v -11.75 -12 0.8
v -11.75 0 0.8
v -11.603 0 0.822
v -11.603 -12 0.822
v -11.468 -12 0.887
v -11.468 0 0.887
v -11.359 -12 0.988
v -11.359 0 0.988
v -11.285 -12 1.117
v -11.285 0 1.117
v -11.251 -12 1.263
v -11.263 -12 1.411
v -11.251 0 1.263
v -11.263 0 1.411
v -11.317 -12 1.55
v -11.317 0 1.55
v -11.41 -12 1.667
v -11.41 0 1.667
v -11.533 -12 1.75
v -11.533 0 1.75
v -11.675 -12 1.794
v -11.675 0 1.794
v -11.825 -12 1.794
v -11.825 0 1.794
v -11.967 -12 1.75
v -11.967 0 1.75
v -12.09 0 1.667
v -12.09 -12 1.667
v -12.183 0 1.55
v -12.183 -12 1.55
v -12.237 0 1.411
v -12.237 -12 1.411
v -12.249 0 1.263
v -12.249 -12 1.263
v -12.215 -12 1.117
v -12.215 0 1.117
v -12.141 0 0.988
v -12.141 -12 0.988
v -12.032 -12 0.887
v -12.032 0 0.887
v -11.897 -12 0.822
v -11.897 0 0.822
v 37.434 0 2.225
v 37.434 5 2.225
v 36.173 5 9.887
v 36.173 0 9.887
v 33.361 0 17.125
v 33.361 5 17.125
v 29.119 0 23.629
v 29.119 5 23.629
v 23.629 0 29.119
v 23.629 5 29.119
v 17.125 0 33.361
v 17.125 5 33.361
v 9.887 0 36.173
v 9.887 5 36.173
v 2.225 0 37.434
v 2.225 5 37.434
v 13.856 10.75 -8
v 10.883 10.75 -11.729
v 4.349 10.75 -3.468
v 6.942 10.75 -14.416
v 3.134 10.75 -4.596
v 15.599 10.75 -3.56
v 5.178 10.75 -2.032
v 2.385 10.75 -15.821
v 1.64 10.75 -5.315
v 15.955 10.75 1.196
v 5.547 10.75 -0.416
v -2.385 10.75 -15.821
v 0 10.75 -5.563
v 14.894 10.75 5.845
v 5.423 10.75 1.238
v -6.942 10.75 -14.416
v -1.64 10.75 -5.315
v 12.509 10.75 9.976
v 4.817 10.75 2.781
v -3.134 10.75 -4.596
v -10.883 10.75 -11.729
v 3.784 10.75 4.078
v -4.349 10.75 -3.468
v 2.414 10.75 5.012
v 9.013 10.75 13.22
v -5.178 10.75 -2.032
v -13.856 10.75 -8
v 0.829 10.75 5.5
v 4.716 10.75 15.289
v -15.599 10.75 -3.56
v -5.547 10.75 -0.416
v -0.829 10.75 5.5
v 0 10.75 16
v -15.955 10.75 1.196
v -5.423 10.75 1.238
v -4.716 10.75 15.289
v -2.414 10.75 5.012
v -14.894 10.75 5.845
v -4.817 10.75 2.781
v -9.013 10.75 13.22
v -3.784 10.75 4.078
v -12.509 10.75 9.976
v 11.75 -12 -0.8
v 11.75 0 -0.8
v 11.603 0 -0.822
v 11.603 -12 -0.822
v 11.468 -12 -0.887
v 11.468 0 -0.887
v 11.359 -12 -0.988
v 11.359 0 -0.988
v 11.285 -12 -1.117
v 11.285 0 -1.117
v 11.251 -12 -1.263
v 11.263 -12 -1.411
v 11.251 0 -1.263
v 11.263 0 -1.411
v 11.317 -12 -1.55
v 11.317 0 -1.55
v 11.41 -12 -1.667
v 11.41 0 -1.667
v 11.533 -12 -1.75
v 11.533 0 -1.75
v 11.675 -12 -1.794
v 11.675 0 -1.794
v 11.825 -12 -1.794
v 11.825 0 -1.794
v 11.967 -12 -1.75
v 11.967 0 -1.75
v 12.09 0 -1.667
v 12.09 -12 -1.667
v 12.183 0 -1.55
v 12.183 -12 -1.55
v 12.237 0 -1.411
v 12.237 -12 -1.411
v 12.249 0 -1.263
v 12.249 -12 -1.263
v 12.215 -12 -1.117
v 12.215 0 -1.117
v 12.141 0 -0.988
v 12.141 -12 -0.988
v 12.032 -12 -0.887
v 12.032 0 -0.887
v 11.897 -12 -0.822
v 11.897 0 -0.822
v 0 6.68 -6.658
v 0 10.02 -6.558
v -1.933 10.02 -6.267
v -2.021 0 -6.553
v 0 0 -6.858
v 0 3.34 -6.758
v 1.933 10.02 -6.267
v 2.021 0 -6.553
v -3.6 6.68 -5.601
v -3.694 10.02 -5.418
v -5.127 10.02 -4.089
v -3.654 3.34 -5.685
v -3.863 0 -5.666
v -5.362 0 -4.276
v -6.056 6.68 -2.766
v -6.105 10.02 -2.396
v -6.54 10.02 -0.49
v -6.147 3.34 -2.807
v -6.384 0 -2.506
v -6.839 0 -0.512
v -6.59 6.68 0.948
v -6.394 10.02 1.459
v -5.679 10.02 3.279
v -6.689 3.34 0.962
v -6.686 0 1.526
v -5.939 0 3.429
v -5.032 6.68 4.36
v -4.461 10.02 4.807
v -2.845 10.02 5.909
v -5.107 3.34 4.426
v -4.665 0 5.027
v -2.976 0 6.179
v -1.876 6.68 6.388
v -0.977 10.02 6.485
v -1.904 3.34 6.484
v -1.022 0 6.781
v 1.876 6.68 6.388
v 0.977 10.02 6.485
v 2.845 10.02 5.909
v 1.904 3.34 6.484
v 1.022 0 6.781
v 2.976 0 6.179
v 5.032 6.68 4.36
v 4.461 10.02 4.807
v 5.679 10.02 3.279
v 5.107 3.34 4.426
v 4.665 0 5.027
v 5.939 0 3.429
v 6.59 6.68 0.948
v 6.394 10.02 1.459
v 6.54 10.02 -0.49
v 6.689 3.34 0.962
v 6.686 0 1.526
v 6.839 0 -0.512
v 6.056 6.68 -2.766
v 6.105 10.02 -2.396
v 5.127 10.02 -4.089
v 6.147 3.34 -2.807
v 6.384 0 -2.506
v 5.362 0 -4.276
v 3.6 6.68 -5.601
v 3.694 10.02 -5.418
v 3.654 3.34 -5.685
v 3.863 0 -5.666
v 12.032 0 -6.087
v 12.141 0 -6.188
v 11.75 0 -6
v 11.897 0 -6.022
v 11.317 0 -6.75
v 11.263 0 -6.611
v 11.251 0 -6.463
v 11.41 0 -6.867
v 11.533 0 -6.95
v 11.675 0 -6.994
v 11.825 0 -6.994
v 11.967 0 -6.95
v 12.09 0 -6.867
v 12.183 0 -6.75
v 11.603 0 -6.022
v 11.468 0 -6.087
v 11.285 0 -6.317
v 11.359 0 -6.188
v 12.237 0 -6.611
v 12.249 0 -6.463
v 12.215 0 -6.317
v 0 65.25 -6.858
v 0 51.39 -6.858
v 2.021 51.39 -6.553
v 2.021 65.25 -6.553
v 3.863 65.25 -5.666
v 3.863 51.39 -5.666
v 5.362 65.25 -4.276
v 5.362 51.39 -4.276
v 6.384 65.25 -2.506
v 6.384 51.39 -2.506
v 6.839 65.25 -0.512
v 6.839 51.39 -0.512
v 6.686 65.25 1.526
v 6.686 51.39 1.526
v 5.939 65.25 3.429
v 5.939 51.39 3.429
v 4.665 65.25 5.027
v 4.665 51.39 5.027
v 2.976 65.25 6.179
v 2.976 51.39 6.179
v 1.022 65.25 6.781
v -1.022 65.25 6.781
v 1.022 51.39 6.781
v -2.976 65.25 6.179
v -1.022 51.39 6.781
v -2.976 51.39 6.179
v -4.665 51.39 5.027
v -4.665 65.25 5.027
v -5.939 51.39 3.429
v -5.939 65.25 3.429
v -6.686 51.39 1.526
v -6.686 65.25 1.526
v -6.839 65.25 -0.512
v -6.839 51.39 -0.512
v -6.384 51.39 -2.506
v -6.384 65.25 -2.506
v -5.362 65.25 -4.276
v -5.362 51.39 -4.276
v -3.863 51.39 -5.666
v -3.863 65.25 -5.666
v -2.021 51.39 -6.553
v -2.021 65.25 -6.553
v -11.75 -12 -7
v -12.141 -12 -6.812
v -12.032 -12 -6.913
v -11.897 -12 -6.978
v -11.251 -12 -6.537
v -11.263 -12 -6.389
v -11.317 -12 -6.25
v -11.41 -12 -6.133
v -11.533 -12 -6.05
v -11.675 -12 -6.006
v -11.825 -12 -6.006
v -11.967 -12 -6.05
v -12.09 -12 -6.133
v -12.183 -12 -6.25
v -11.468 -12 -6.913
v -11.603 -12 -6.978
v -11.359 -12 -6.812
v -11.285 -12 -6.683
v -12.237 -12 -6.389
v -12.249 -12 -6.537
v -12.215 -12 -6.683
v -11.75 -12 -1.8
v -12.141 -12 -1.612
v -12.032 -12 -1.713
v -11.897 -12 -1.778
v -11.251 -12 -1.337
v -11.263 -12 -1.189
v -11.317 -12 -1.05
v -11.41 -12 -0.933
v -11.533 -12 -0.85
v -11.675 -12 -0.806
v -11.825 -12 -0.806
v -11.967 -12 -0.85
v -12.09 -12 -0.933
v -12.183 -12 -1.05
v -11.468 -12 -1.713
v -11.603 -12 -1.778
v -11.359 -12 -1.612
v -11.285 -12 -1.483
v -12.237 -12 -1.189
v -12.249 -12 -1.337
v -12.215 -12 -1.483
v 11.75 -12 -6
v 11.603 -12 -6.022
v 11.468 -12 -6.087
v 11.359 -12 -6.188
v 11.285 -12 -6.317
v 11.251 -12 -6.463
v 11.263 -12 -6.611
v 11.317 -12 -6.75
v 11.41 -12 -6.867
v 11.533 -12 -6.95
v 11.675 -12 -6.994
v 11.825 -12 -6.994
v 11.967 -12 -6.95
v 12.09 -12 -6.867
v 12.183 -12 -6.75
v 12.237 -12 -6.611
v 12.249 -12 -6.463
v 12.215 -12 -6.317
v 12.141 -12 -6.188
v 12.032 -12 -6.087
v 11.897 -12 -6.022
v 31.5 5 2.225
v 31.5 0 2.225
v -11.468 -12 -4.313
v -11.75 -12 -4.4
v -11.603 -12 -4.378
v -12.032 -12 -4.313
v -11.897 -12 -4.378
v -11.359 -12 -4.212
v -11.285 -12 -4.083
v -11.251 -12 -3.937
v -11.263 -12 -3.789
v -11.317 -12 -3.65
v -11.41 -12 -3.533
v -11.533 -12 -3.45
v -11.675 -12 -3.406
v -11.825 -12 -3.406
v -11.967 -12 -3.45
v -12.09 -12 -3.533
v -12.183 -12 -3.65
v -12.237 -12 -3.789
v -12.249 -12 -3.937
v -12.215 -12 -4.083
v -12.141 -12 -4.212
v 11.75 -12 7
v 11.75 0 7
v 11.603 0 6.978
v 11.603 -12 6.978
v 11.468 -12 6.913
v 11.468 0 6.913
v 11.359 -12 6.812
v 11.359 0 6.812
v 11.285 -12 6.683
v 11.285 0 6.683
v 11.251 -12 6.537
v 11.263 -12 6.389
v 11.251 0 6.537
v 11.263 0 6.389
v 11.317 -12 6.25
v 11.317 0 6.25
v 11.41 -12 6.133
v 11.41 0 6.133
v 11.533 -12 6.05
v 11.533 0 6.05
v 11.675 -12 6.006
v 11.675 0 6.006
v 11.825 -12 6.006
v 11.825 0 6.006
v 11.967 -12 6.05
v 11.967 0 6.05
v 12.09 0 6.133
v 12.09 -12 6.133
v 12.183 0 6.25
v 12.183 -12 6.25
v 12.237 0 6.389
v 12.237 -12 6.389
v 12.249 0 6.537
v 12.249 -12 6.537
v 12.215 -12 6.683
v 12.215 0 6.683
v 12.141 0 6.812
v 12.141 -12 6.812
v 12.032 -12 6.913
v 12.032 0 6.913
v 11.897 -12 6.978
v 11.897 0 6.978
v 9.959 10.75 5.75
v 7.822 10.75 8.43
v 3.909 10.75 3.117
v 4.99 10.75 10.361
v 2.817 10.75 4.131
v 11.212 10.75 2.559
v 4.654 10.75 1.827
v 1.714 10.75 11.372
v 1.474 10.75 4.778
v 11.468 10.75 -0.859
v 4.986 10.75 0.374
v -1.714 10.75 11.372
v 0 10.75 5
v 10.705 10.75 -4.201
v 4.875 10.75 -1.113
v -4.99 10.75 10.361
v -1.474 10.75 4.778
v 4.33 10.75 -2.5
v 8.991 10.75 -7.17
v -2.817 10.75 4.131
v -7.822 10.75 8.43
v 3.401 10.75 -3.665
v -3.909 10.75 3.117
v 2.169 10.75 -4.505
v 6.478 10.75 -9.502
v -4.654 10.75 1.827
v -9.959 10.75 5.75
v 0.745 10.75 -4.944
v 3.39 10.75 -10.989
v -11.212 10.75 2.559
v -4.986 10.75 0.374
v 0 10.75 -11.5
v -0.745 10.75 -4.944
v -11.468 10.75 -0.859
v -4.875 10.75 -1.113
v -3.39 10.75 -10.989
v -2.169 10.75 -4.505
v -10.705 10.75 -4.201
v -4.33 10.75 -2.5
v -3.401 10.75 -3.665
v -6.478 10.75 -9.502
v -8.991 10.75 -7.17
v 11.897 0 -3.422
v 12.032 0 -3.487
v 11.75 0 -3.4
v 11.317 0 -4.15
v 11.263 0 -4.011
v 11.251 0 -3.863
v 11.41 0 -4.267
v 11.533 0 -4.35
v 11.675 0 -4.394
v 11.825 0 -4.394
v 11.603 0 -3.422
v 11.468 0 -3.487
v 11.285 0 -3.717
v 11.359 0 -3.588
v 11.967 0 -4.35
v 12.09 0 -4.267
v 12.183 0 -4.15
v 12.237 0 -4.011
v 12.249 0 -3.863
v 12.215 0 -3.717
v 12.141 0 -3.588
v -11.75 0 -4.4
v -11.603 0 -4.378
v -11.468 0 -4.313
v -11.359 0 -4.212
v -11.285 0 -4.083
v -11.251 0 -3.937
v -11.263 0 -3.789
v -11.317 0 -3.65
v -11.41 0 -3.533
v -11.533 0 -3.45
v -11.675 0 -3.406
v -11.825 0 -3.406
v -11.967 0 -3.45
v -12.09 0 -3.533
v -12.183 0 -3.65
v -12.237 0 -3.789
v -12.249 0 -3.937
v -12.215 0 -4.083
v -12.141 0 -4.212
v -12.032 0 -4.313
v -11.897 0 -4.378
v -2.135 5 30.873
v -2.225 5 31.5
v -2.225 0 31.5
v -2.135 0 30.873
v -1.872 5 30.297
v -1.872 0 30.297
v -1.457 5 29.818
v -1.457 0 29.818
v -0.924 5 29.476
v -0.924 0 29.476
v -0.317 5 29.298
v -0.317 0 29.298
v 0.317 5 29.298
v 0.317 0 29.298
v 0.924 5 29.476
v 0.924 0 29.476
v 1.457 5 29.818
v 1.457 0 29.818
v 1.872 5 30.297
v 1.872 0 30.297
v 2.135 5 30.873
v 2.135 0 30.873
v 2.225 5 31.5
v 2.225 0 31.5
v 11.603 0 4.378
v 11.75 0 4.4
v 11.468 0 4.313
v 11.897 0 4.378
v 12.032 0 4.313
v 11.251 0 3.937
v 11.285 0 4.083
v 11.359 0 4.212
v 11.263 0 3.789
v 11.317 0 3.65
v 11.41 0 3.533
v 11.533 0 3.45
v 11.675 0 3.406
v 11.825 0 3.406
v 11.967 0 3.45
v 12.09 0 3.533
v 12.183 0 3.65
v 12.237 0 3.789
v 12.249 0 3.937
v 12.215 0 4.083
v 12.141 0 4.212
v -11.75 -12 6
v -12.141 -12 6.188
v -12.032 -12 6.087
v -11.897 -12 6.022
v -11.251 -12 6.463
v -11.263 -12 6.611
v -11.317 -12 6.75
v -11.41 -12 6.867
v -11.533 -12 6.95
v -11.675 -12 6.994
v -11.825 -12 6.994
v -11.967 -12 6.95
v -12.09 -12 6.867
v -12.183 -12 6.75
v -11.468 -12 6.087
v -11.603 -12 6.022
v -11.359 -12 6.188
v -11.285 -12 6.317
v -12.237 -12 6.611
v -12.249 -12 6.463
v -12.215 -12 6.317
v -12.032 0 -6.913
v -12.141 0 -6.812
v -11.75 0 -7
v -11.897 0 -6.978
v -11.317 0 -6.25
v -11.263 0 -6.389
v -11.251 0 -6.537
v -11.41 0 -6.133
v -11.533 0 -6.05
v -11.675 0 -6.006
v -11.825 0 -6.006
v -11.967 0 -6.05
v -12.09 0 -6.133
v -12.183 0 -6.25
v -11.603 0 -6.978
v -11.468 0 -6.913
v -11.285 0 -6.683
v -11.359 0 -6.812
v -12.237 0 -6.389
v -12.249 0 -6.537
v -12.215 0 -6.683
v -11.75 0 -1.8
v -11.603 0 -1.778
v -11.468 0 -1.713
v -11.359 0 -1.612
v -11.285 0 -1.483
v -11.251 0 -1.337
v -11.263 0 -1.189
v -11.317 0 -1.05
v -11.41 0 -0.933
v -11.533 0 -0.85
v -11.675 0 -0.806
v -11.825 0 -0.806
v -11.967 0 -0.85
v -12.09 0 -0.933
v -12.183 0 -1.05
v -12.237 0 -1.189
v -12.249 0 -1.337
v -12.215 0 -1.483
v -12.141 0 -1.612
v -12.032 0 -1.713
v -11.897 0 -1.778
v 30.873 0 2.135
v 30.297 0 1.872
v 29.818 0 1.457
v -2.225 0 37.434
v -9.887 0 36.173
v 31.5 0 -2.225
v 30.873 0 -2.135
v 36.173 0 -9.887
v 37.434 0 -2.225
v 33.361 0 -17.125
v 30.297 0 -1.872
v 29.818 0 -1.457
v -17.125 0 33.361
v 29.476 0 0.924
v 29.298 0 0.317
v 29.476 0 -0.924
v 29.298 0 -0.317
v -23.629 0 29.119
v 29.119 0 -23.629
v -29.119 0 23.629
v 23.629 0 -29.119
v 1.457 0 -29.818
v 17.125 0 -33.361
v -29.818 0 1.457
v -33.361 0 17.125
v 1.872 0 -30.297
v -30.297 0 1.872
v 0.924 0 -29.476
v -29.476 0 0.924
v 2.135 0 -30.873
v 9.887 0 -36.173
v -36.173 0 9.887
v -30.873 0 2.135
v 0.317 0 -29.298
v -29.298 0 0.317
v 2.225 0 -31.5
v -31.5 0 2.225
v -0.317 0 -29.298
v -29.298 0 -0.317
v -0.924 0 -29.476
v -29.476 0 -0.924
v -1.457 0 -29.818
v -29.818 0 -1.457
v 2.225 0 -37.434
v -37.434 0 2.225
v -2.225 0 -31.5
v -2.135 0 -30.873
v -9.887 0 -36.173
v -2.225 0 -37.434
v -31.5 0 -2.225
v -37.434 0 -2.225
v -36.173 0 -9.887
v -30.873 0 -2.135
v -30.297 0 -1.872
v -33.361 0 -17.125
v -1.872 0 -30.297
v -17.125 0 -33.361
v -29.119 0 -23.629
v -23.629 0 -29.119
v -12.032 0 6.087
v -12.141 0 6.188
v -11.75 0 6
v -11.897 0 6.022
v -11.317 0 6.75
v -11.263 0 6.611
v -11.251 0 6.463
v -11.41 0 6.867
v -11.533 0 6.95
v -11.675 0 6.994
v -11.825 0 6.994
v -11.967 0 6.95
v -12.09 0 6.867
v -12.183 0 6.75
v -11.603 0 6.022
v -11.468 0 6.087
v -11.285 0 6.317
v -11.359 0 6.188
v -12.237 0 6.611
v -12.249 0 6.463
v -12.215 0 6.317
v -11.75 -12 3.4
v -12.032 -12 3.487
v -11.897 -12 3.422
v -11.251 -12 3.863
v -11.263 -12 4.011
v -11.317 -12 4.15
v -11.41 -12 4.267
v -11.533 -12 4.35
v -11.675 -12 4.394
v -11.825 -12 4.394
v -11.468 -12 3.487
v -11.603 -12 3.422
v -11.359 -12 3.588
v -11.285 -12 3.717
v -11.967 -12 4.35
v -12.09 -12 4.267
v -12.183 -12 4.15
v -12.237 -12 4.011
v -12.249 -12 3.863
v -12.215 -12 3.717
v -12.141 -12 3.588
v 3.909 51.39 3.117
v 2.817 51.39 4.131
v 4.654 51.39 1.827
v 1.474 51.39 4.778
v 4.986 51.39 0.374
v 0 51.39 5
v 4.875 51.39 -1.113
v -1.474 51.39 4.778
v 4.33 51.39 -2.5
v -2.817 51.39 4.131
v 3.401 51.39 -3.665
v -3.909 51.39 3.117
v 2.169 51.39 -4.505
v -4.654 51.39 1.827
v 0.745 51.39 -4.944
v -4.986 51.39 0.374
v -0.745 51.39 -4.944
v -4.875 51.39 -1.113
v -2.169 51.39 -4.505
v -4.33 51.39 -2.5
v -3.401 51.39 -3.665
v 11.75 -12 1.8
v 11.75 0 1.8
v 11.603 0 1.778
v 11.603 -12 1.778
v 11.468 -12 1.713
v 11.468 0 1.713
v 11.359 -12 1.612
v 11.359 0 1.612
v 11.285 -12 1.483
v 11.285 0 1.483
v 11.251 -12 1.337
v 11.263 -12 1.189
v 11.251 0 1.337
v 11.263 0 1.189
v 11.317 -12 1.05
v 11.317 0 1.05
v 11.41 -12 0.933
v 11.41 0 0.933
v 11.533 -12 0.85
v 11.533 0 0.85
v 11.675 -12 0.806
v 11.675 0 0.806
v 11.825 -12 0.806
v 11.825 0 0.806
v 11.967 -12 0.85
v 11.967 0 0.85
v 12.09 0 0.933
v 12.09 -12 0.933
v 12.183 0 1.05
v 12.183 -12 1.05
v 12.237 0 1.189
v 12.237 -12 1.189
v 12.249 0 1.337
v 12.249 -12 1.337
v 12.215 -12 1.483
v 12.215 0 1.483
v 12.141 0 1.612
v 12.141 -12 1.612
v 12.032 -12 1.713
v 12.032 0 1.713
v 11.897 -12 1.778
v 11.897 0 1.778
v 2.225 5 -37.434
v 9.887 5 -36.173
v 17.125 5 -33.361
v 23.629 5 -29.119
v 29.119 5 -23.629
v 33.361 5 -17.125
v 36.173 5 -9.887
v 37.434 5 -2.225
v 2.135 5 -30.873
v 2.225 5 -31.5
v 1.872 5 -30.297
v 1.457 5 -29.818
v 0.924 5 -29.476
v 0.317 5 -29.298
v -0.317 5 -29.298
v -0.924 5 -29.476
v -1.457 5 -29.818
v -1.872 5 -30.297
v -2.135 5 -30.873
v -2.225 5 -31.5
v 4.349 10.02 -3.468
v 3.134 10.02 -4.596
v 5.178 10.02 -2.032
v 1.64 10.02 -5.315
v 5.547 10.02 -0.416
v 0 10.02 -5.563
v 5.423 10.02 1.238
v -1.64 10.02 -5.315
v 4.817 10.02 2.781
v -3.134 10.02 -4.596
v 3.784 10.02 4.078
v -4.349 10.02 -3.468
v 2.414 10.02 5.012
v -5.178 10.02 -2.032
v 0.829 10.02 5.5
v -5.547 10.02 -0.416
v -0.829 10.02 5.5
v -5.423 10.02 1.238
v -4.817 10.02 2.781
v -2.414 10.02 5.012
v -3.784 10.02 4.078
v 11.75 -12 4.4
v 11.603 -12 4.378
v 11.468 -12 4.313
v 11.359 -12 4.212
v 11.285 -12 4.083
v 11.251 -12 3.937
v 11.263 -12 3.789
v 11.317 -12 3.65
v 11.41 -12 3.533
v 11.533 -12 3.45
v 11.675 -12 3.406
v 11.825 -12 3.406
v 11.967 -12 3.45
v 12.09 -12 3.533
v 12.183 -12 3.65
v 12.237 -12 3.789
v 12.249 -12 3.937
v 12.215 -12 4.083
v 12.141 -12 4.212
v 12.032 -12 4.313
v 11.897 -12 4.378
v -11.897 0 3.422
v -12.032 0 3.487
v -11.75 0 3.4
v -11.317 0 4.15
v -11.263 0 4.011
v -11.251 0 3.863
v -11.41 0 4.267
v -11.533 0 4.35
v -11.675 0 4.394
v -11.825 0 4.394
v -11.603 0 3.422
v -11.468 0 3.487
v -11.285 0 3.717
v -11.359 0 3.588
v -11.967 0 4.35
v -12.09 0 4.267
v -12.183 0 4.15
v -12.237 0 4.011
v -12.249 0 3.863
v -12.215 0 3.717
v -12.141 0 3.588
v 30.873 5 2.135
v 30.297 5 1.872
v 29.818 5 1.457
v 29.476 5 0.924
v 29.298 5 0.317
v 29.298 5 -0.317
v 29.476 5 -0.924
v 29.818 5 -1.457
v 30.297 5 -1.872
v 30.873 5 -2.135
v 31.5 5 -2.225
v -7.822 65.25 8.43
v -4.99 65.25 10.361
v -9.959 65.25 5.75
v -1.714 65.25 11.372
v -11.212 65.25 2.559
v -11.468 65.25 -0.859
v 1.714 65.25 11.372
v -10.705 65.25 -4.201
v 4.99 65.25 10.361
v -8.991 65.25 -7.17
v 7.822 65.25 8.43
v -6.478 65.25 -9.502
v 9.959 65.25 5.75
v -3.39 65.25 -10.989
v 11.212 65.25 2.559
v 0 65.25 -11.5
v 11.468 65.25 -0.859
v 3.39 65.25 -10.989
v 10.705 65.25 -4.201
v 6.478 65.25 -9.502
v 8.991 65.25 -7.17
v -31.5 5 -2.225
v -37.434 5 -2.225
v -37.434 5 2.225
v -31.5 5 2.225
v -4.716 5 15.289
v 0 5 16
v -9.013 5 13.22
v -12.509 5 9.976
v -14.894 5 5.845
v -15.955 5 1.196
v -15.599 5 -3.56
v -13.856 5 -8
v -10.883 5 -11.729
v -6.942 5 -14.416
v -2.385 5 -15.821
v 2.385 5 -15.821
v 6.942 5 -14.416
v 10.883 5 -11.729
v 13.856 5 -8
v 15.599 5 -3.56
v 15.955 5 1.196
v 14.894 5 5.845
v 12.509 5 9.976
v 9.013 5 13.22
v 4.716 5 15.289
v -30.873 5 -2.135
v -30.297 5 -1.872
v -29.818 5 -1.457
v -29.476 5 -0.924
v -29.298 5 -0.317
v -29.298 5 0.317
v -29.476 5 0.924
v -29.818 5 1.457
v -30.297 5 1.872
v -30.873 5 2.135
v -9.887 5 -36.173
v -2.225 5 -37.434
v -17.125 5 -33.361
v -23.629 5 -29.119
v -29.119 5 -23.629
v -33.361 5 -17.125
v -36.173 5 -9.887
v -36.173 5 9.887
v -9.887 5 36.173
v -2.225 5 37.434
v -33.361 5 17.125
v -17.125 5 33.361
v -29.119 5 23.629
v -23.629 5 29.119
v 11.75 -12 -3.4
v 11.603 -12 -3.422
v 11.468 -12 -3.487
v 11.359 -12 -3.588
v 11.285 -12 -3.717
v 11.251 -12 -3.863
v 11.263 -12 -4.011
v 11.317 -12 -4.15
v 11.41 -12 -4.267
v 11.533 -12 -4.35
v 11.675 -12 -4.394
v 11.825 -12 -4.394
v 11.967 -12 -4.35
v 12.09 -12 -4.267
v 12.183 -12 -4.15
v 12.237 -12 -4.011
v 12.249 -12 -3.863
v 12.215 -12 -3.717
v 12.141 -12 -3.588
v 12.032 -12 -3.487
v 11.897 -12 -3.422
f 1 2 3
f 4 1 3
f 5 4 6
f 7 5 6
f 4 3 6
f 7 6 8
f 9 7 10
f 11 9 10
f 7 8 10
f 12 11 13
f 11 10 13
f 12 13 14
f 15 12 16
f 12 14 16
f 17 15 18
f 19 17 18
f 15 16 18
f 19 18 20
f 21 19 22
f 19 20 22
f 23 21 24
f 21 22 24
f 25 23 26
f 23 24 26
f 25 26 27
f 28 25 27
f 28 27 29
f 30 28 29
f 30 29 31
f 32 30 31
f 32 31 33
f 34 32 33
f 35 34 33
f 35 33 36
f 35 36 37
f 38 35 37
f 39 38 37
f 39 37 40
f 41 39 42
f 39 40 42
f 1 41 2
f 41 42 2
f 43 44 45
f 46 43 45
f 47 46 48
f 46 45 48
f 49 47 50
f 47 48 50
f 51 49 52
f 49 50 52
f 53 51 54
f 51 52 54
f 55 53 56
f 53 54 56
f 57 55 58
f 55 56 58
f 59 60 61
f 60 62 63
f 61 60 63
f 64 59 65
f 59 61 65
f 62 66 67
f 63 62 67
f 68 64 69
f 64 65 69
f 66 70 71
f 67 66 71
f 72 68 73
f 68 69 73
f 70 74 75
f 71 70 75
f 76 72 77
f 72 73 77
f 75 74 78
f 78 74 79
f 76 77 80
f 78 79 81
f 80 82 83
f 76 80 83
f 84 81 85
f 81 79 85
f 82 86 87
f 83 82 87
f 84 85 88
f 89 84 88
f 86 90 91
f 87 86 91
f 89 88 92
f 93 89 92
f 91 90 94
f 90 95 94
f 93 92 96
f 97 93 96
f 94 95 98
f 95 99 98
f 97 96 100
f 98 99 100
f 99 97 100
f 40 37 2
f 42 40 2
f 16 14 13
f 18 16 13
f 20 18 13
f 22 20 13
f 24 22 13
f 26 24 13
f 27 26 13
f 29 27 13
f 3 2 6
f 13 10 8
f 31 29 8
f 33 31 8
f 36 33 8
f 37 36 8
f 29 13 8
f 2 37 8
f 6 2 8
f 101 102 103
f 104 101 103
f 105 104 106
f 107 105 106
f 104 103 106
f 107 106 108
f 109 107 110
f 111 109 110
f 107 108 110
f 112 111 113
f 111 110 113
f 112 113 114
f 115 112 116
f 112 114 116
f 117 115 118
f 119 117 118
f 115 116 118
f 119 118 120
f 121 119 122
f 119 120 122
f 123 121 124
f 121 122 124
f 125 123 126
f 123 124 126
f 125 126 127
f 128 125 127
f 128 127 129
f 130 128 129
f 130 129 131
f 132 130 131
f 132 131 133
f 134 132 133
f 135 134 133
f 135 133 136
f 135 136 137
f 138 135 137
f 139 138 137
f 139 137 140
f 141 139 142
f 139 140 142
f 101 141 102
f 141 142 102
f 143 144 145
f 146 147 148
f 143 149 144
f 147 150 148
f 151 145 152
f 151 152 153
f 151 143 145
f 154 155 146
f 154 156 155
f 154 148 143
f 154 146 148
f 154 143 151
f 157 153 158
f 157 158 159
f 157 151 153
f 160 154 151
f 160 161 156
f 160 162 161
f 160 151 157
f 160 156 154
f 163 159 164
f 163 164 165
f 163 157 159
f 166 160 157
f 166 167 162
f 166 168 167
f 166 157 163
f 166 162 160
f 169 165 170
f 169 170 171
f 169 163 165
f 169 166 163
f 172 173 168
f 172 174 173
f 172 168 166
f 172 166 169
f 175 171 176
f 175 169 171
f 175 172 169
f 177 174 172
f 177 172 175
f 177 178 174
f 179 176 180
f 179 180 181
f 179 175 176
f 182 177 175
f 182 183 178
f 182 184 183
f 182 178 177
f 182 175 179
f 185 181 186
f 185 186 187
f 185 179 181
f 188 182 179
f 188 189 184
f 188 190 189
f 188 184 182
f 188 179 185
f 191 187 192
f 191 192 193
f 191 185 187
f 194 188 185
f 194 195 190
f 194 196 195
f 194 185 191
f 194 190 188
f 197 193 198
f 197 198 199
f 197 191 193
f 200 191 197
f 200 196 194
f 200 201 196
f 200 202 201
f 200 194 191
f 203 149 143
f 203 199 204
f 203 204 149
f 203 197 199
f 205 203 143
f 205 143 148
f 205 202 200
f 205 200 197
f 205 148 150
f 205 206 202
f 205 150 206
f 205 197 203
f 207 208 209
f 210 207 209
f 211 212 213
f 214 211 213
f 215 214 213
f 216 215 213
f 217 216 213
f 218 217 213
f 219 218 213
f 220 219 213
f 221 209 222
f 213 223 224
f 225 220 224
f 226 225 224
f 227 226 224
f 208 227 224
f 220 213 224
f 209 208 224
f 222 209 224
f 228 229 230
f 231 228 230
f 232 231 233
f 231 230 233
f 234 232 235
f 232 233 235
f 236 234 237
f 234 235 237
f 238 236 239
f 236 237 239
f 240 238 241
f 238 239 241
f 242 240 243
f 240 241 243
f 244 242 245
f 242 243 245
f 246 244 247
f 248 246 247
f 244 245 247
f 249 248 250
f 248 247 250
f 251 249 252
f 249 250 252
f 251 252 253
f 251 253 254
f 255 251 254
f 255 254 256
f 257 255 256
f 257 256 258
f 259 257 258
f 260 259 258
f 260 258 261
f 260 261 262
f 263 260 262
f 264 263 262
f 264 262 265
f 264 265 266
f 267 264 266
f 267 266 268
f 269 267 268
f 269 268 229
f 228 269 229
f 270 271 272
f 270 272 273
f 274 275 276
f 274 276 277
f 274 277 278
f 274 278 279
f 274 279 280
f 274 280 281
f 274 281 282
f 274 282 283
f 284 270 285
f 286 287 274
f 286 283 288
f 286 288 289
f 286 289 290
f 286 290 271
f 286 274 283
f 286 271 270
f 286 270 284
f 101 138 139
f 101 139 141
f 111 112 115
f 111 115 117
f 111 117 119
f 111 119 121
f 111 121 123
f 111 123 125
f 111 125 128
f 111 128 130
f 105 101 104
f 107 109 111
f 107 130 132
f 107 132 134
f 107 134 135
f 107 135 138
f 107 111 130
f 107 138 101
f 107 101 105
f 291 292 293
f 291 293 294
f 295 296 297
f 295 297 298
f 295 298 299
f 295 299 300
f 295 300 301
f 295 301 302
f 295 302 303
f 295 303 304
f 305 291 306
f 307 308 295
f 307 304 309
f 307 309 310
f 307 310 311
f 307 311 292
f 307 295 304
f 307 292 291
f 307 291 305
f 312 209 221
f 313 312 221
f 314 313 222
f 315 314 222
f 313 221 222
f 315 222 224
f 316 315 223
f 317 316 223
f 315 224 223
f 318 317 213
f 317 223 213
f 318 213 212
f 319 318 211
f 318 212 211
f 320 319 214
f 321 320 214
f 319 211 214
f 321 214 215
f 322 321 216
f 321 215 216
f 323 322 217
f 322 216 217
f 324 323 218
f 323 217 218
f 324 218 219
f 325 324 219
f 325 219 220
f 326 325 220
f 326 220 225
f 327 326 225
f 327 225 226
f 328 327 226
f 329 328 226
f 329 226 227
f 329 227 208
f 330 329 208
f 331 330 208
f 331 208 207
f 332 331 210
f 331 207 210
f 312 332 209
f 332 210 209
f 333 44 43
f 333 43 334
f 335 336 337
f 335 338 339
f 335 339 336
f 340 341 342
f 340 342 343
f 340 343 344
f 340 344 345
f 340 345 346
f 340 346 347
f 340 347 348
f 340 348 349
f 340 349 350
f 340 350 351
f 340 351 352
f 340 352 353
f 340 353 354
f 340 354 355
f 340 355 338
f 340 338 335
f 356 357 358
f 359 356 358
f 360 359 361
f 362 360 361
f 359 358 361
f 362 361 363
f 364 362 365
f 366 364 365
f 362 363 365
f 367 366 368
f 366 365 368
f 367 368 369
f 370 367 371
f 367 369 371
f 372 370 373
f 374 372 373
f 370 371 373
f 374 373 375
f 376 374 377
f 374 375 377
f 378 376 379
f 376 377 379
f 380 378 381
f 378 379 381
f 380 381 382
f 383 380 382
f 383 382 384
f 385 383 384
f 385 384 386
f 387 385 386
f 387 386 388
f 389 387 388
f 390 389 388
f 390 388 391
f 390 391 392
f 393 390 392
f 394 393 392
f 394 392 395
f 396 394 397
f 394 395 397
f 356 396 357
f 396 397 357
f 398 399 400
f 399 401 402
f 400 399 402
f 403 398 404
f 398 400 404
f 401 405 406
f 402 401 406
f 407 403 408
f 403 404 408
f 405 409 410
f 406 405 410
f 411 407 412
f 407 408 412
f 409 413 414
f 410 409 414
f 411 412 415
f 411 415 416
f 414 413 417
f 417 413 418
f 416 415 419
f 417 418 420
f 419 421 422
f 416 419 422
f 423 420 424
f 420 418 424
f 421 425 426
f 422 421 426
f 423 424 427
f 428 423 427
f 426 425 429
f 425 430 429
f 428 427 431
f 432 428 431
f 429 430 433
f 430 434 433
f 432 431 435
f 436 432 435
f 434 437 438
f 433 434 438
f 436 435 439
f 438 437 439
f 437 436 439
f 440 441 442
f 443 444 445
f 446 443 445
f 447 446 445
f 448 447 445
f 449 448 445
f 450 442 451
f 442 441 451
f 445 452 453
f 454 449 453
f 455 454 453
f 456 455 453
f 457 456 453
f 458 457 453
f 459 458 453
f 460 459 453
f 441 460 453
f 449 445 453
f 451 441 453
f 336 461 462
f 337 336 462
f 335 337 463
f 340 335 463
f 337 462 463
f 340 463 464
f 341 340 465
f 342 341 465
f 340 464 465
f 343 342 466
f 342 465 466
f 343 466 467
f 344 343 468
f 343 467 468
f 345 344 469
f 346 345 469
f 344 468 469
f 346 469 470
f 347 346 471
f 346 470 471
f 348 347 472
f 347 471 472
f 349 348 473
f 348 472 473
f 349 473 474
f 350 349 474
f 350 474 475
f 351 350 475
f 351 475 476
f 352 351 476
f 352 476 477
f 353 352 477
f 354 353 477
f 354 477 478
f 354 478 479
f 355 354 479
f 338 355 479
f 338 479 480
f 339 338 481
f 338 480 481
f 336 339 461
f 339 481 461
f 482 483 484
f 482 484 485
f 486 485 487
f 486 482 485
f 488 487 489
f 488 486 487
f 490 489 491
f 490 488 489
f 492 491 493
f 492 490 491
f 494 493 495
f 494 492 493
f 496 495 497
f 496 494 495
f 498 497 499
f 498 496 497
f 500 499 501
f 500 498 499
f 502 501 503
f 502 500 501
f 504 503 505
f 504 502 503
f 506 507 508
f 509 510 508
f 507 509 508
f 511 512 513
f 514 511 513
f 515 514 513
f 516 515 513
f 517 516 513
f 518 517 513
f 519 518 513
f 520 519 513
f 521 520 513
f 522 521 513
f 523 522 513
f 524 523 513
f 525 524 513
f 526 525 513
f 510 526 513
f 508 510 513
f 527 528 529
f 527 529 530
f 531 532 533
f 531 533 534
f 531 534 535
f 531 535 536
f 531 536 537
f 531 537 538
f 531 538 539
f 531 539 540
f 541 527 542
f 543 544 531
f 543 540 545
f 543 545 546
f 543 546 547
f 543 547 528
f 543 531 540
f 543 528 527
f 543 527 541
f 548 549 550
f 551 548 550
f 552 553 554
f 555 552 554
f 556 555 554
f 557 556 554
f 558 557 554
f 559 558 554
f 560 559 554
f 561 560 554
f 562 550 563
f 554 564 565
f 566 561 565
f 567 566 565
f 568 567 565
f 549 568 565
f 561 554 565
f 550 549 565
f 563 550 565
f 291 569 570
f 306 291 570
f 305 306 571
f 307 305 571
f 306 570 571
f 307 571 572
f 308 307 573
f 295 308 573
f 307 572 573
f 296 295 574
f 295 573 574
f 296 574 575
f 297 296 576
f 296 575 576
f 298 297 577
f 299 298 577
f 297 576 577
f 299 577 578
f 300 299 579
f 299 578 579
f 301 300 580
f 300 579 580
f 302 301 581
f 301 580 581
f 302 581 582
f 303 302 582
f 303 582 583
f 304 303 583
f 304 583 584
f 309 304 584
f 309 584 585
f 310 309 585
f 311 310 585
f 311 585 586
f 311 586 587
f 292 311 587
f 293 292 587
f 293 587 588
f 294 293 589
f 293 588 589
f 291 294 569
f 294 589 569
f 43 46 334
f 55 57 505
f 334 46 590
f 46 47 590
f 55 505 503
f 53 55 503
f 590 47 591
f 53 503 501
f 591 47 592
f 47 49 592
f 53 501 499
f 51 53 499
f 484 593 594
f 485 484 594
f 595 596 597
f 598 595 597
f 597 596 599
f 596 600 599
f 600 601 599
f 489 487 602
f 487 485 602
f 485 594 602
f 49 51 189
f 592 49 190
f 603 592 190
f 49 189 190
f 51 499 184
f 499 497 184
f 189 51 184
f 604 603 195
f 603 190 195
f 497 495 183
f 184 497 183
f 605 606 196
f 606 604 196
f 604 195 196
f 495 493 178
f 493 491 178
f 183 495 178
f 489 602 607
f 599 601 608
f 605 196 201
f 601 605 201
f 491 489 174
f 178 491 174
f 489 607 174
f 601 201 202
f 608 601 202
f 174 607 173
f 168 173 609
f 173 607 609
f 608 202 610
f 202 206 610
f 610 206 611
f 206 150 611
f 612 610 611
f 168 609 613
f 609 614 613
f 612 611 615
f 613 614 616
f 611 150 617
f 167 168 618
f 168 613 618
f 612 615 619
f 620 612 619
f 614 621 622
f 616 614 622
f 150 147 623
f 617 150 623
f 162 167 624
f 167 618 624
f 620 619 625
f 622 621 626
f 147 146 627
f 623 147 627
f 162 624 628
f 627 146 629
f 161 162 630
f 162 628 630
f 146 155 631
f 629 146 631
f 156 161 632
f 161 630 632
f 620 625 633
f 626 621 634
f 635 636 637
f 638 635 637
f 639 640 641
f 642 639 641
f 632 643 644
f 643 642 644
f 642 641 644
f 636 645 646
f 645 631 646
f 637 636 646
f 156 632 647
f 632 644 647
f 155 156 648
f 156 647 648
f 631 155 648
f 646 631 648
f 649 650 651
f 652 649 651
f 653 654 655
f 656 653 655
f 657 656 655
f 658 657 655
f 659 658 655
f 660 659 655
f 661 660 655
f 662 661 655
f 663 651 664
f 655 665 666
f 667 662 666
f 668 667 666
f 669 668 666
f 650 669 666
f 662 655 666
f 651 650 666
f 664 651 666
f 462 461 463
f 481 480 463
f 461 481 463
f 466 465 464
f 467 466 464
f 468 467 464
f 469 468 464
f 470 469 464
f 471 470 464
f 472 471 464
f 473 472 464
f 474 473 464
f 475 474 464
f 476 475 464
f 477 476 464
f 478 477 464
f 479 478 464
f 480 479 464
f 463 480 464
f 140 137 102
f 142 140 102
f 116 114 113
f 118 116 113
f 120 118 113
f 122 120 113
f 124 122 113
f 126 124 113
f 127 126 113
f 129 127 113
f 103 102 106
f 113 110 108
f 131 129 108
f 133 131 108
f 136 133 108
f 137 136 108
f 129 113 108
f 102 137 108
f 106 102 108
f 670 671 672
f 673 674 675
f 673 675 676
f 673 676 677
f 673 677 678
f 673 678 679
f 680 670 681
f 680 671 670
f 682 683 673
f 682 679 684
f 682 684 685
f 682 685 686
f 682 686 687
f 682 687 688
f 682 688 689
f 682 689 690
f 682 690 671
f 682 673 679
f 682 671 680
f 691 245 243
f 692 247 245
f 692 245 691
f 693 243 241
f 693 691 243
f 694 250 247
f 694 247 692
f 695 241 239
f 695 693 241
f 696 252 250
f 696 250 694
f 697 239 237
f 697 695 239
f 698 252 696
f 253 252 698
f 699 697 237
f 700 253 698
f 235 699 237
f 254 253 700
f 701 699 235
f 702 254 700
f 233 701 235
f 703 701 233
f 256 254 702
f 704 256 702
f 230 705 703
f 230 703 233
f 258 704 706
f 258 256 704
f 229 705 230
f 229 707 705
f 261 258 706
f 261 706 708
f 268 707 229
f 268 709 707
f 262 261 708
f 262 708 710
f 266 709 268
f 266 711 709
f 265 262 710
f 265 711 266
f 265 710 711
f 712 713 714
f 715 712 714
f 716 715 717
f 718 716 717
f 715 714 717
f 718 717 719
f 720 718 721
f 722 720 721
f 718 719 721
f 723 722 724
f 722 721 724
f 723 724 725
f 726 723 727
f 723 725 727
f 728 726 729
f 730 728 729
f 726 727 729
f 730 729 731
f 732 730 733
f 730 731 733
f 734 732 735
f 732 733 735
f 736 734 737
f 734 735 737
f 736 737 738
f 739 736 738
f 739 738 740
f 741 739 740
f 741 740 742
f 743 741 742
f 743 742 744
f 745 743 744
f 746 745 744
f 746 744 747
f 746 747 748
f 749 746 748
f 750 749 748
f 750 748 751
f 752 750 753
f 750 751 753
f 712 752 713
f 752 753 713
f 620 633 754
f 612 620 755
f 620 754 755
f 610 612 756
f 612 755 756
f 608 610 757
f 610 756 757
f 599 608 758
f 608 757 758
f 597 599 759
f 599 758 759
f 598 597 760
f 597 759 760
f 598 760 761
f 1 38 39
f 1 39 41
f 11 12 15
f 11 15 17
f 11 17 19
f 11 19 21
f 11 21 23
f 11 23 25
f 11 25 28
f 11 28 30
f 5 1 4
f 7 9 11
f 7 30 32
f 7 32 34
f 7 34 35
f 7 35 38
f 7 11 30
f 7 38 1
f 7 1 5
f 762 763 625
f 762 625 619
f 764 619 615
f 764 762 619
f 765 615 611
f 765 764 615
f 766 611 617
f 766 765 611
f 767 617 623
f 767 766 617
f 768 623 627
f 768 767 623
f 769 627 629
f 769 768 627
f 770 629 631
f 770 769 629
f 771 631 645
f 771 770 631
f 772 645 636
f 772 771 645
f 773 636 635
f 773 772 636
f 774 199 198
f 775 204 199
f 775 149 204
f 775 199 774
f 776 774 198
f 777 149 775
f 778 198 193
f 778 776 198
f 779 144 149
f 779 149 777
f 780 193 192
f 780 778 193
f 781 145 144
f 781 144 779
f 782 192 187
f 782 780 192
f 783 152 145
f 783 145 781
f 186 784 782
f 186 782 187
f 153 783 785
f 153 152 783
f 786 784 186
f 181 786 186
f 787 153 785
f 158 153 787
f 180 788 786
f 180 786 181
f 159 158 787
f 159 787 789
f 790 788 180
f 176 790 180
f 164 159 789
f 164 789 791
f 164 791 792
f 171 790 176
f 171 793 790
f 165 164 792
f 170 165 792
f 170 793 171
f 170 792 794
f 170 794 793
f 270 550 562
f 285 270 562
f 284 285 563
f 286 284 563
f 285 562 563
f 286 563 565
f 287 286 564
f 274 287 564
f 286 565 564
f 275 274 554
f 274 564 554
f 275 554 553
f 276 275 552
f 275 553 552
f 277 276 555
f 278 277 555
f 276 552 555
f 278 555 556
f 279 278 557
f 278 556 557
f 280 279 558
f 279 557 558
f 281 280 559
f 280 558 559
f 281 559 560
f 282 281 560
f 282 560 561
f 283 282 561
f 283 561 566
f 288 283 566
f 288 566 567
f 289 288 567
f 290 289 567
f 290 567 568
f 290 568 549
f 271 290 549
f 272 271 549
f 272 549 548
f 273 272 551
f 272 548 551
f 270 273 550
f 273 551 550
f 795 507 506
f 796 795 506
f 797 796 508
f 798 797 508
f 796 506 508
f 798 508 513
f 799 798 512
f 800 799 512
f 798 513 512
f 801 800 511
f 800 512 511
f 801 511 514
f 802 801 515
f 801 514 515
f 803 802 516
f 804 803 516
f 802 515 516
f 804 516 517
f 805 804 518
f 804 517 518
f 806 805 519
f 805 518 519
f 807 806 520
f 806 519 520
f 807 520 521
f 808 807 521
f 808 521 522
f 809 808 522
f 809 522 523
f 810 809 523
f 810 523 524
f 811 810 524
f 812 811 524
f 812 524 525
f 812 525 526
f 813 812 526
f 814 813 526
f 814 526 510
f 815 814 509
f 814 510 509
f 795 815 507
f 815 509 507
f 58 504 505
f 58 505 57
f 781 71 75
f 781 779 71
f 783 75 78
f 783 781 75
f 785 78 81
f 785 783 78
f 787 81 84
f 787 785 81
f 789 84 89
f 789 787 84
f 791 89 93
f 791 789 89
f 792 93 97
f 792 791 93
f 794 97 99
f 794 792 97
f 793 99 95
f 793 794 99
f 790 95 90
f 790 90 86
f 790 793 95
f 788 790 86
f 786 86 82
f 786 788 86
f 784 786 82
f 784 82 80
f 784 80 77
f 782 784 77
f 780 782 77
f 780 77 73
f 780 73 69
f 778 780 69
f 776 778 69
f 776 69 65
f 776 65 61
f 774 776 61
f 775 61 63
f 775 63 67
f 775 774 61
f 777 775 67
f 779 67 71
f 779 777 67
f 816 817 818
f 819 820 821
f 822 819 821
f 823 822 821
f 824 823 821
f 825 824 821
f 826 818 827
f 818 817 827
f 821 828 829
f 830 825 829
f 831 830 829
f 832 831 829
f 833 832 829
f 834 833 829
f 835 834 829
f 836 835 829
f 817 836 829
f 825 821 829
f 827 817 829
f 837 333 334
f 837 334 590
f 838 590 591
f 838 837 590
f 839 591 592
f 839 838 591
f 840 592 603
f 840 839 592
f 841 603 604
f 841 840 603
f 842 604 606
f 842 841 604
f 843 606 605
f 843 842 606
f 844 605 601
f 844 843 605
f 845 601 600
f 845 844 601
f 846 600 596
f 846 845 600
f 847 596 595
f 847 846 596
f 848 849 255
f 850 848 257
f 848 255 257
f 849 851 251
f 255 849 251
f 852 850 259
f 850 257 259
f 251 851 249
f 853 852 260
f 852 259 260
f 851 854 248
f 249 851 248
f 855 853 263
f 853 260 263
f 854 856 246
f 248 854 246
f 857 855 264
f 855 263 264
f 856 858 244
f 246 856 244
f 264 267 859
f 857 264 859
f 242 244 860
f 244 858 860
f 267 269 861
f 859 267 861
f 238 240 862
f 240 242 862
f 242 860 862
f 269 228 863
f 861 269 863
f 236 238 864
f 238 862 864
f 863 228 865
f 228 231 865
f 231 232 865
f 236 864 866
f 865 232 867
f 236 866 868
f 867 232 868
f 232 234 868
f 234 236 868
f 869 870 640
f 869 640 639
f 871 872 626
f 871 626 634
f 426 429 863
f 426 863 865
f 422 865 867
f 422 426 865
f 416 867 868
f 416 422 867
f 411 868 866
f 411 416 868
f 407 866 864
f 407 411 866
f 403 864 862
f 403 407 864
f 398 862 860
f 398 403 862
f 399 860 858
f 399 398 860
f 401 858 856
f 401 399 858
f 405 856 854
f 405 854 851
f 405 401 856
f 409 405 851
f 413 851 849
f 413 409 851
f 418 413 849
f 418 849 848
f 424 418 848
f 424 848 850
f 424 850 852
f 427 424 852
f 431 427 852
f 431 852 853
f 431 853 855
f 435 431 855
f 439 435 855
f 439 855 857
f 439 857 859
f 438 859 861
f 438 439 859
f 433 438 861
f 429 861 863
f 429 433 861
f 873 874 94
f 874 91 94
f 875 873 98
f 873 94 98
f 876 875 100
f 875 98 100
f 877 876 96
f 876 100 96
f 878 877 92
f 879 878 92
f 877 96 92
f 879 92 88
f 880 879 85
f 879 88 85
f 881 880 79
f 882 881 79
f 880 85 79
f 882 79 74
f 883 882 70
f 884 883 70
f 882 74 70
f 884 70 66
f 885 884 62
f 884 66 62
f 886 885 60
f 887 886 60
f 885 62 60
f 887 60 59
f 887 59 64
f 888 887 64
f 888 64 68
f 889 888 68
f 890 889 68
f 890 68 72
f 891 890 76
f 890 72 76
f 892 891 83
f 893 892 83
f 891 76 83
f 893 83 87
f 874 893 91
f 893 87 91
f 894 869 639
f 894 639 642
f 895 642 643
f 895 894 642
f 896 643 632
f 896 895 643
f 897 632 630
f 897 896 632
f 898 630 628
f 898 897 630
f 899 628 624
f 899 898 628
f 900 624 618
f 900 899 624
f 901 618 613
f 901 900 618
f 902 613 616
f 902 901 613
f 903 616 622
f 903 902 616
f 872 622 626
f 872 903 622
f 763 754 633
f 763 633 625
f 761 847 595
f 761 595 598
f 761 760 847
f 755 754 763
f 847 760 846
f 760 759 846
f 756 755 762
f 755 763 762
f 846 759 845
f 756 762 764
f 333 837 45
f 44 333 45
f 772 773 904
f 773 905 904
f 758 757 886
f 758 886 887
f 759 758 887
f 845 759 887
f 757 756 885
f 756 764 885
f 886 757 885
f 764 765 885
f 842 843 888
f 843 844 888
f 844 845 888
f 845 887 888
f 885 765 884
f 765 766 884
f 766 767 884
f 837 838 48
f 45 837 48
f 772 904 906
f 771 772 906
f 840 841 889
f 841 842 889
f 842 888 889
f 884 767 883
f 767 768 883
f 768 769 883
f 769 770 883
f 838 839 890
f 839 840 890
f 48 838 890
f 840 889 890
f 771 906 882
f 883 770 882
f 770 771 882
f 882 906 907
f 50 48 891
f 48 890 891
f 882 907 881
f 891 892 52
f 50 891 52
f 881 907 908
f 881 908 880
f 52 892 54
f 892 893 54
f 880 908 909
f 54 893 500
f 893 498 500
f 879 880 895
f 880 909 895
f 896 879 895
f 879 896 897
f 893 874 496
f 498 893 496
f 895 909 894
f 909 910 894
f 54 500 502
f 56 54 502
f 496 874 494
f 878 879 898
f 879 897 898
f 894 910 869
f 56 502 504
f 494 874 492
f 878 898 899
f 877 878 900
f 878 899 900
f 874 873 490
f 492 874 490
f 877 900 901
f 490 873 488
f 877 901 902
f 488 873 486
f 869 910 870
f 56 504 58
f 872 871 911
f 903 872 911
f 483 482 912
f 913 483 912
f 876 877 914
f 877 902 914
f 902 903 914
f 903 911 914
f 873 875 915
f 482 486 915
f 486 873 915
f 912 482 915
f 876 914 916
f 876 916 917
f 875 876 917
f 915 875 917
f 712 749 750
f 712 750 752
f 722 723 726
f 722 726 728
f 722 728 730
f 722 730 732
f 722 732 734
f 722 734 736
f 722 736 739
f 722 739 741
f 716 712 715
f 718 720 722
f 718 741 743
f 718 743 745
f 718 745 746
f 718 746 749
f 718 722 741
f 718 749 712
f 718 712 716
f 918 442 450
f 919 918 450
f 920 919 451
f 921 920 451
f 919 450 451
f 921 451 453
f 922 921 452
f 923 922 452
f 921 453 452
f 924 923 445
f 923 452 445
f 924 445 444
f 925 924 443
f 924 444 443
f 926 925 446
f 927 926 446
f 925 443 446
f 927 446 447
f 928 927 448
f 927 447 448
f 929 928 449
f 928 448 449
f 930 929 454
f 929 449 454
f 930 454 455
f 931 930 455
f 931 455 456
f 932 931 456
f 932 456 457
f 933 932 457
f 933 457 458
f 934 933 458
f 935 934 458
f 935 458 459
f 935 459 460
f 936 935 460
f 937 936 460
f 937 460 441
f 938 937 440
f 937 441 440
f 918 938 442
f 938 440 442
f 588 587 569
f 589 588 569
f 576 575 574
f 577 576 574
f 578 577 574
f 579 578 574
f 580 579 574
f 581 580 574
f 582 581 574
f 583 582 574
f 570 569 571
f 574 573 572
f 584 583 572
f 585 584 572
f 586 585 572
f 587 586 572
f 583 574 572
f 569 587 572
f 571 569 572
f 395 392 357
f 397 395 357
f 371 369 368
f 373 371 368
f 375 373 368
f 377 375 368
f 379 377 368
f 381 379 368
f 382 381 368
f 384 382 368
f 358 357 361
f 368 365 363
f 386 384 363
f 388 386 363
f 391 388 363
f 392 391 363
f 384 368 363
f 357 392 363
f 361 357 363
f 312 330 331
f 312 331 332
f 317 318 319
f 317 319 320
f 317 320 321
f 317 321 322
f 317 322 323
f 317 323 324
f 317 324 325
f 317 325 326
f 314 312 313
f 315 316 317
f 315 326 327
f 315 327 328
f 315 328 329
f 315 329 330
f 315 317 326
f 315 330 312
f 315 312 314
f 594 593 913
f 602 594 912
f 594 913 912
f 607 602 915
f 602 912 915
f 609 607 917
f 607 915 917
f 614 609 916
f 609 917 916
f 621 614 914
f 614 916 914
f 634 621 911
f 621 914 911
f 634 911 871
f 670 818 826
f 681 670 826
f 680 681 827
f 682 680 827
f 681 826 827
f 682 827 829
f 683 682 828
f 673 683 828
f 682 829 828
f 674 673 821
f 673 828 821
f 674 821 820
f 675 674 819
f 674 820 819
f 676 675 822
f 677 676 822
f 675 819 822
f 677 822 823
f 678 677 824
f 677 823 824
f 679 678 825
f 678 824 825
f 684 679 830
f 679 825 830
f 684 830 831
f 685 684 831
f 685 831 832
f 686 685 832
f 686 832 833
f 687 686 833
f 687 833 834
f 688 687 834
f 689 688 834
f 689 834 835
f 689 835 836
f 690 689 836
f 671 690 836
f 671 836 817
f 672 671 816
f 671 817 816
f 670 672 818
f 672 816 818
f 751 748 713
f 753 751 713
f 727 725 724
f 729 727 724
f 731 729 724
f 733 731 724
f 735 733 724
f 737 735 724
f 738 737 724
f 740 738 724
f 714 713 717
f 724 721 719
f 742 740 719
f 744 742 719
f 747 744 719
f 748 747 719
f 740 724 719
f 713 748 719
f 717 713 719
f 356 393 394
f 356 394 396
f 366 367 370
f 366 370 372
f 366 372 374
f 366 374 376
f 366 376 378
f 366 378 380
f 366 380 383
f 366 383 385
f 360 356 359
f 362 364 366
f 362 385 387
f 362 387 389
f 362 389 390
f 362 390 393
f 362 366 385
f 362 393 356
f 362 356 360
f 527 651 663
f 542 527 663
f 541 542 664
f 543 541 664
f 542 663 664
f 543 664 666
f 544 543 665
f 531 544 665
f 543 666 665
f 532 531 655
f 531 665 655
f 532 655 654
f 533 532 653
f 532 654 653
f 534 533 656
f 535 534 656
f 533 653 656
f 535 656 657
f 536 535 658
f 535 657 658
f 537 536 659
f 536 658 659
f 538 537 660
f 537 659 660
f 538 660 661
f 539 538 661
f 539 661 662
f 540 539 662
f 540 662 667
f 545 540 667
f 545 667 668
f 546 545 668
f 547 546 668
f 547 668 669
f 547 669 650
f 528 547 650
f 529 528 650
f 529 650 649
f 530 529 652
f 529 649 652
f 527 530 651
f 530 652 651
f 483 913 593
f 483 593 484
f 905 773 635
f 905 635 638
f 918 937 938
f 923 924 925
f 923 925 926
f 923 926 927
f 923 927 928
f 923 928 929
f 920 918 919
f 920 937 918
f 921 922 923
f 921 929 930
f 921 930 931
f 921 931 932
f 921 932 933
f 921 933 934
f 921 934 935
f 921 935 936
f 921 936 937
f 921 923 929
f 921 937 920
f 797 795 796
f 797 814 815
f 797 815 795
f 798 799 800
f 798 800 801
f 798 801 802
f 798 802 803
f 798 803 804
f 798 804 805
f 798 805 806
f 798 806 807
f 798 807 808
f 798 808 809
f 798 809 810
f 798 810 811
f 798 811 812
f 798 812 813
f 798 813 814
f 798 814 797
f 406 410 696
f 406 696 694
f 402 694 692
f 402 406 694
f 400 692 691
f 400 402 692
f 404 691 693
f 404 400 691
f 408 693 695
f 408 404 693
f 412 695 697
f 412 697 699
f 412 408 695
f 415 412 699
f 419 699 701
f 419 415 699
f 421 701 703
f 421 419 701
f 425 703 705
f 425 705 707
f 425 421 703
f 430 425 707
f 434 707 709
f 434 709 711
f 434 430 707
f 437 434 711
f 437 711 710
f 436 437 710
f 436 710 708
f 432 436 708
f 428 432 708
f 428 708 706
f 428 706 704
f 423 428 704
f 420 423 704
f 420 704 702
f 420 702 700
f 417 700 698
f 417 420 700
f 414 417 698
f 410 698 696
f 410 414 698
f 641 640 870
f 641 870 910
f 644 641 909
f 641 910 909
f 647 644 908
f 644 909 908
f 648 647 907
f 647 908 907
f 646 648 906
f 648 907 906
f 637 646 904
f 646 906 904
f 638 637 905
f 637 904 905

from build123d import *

# Parameters (mm, degrees)
CUT_EXTRUDE1_DEPTH     = 54.343814074
CIRPATTERN1_COUNT      = 4
SKETCH7_R              = 0.5
BOSS_EXTRUDE1_DEPTH    = 12
BOSS_EXTRUDE1_2_DEPTH  = 12
BOSS_EXTRUDE1_3_DEPTH  = 12
BOSS_EXTRUDE1_4_DEPTH  = 12
BOSS_EXTRUDE1_5_DEPTH  = 12
BOSS_EXTRUDE1_6_DEPTH  = 12
BOSS_EXTRUDE1_7_DEPTH  = 12
BOSS_EXTRUDE1_8_DEPTH  = 12
BOSS_EXTRUDE1_9_DEPTH  = 12
BOSS_EXTRUDE1_10_DEPTH = 12
BOSS_EXTRUDE1_11_DEPTH = 12
BOSS_EXTRUDE1_12_DEPTH = 12
SKETCH8_R              = 11.5
SKETCH8_R_2            = 6.858
BOSS_EXTRUDE3_DEPTH    = 54.5
SKETCH9_R              = 6.858
SKETCH9_R_2            = 5
BOSS_EXTRUDE4_DEPTH    = 40.64


with BuildPart() as part:
    # Sketch2 → Revolve1 (revolve)
    with BuildSketch(Plane.XY, mode=Mode.PRIVATE) as revolve1_sk:
        Polygon((0, 0), (37.5, 0), (37.5, 5), (16, 5), (16, 10.75), (0, 10.75), align=None)
    revolve(revolve1_sk.sketch.rotate(Axis((0, 10.75, 0), (0, -1, 0)), 90), axis=Axis((0, 10.75, 0), (0, -1, 0)))

    # Sketch4 → 1/4 NPT Tapped Hole1 (revolve, cut)
    with BuildSketch(Plane(origin=(0, 0, 0), x_dir=(0, 0, -1), z_dir=(1, 0, 0))):
        Polygon((0, 0), (0, 10.75), (5.5626, 10.75), (5.5626, 10.0203), (6.557978799, 10.0203), (6.858, 0), align=None)
    revolve(axis=Axis((0, -6.35, 0), (0, 1, 0)), mode=Mode.SUBTRACT)

    # Sketch5 → Cut-Extrude1 (cut, through all)
    with BuildSketch(Plane(origin=(0, 5, 0), x_dir=(1, 0, 0), z_dir=(0, 1, 0))):
        with BuildLine():
            Line((2.225, 37.5), (2.225, 31.5))
            ThreePointArc((2.225, 31.5), (0, 29.275), (-2.225, 31.5))
            Line((-2.225, 31.5), (-2.225, 37.5))
            ThreePointArc((-2.225, 37.5), (0, 39.725), (2.225, 37.5))
        make_face()
    cut_extrude1 = extrude(amount=-CUT_EXTRUDE1_DEPTH, mode=Mode.SUBTRACT)

    # CirPattern1: Cut-Extrude1 ×4 about axis
    cirpattern1_axis = Axis((0, 0, 0), (0, 1, 0))
    for i in range(1, CIRPATTERN1_COUNT):
        add(cut_extrude1.rotate(cirpattern1_axis, i * 360 / CIRPATTERN1_COUNT), mode=Mode.SUBTRACT)


with BuildPart() as body_2:
    # Sketch7 → Boss-Extrude1 (new body)
    with BuildSketch(Plane.XZ):
        with Locations(Location((-11.75, 6.5, 0), (0, 0, 270))):
            Circle(SKETCH7_R)
    extrude(amount=BOSS_EXTRUDE1_DEPTH)


with BuildPart() as body_3:
    # Sketch7 → Boss-Extrude1 2 (new body)
    with BuildSketch(Plane.XZ):
        with Locations(Location((-11.75, 3.9, 0), (0, 0, 270))):
            Circle(SKETCH7_R)
    extrude(amount=BOSS_EXTRUDE1_2_DEPTH)


with BuildPart() as body_4:
    # Sketch7 → Boss-Extrude1 3 (new body)
    with BuildSketch(Plane.XZ):
        with Locations(Location((-11.75, 1.3, 0), (0, 0, 270))):
            Circle(SKETCH7_R)
    extrude(amount=BOSS_EXTRUDE1_3_DEPTH)


with BuildPart() as body_5:
    # Sketch7 → Boss-Extrude1 4 (new body)
    with BuildSketch(Plane.XZ):
        with Locations(Location((-11.75, -1.3, 0), (0, 0, 270))):
            Circle(SKETCH7_R)
    extrude(amount=BOSS_EXTRUDE1_4_DEPTH)


with BuildPart() as body_6:
    # Sketch7 → Boss-Extrude1 5 (new body)
    with BuildSketch(Plane.XZ):
        with Locations(Location((-11.75, -3.9, 0), (0, 0, 270))):
            Circle(SKETCH7_R)
    extrude(amount=BOSS_EXTRUDE1_5_DEPTH)


with BuildPart() as body_7:
    # Sketch7 → Boss-Extrude1 6 (new body)
    with BuildSketch(Plane.XZ):
        with Locations(Location((-11.75, -6.5, 0), (0, 0, 270))):
            Circle(SKETCH7_R)
    extrude(amount=BOSS_EXTRUDE1_6_DEPTH)


with BuildPart() as body_8:
    # Sketch7 → Boss-Extrude1 7 (new body)
    with BuildSketch(Plane.XZ):
        with Locations(Location((11.75, -6.5, 0), (0, 0, 90))):
            Circle(SKETCH7_R)
    extrude(amount=BOSS_EXTRUDE1_7_DEPTH)


with BuildPart() as body_9:
    # Sketch7 → Boss-Extrude1 8 (new body)
    with BuildSketch(Plane.XZ):
        with Locations(Location((11.75, -3.9, 0), (0, 0, 90))):
            Circle(SKETCH7_R)
    extrude(amount=BOSS_EXTRUDE1_8_DEPTH)


with BuildPart() as body_10:
    # Sketch7 → Boss-Extrude1 9 (new body)
    with BuildSketch(Plane.XZ):
        with Locations(Location((11.75, -1.3, 0), (0, 0, 90))):
            Circle(SKETCH7_R)
    extrude(amount=BOSS_EXTRUDE1_9_DEPTH)


with BuildPart() as body_11:
    # Sketch7 → Boss-Extrude1 10 (new body)
    with BuildSketch(Plane.XZ):
        with Locations(Location((11.75, 1.3, 0), (0, 0, 90))):
            Circle(SKETCH7_R)
    extrude(amount=BOSS_EXTRUDE1_10_DEPTH)


with BuildPart() as body_12:
    # Sketch7 → Boss-Extrude1 11 (new body)
    with BuildSketch(Plane.XZ):
        with Locations(Location((11.75, 3.9, 0), (0, 0, 90))):
            Circle(SKETCH7_R)
    extrude(amount=BOSS_EXTRUDE1_11_DEPTH)


with BuildPart() as body_13:
    # Sketch7 → Boss-Extrude1 12 (new body)
    with BuildSketch(Plane.XZ):
        with Locations(Location((11.75, 6.5, 0), (0, 0, 90))):
            Circle(SKETCH7_R)
    extrude(amount=BOSS_EXTRUDE1_12_DEPTH)


with BuildPart() as body_14:
    # Sketch8 → Boss-Extrude3 (new body)
    with BuildSketch(Plane.XZ.offset(-10.75)):
        with Locations(Location((0, 0, 0), (0, 0, 270))):
            Circle(SKETCH8_R)
        with Locations(Location((0, 0, 0), (0, 0, 270))):
            Circle(SKETCH8_R_2, mode=Mode.SUBTRACT)
    extrude(amount=-BOSS_EXTRUDE3_DEPTH)

    # Sketch9 → Boss-Extrude4 (add)
    with BuildSketch(Plane(origin=(0, 10.75, 0), x_dir=(1, 0, 0), z_dir=(0, 1, 0))):
        with Locations(Location((0, 0, 0), (0, 0, 90))):
            Circle(SKETCH9_R)
        with Locations(Location((0, 0, 0), (0, 0, 270))):
            Circle(SKETCH9_R_2, mode=Mode.SUBTRACT)
    extrude(amount=BOSS_EXTRUDE4_DEPTH)


solid = Compound([part.part, body_2.part, body_3.part, body_4.part, body_5.part, body_6.part, body_7.part, body_8.part, body_9.part, body_10.part, body_11.part, body_12.part, body_13.part, body_14.part])
